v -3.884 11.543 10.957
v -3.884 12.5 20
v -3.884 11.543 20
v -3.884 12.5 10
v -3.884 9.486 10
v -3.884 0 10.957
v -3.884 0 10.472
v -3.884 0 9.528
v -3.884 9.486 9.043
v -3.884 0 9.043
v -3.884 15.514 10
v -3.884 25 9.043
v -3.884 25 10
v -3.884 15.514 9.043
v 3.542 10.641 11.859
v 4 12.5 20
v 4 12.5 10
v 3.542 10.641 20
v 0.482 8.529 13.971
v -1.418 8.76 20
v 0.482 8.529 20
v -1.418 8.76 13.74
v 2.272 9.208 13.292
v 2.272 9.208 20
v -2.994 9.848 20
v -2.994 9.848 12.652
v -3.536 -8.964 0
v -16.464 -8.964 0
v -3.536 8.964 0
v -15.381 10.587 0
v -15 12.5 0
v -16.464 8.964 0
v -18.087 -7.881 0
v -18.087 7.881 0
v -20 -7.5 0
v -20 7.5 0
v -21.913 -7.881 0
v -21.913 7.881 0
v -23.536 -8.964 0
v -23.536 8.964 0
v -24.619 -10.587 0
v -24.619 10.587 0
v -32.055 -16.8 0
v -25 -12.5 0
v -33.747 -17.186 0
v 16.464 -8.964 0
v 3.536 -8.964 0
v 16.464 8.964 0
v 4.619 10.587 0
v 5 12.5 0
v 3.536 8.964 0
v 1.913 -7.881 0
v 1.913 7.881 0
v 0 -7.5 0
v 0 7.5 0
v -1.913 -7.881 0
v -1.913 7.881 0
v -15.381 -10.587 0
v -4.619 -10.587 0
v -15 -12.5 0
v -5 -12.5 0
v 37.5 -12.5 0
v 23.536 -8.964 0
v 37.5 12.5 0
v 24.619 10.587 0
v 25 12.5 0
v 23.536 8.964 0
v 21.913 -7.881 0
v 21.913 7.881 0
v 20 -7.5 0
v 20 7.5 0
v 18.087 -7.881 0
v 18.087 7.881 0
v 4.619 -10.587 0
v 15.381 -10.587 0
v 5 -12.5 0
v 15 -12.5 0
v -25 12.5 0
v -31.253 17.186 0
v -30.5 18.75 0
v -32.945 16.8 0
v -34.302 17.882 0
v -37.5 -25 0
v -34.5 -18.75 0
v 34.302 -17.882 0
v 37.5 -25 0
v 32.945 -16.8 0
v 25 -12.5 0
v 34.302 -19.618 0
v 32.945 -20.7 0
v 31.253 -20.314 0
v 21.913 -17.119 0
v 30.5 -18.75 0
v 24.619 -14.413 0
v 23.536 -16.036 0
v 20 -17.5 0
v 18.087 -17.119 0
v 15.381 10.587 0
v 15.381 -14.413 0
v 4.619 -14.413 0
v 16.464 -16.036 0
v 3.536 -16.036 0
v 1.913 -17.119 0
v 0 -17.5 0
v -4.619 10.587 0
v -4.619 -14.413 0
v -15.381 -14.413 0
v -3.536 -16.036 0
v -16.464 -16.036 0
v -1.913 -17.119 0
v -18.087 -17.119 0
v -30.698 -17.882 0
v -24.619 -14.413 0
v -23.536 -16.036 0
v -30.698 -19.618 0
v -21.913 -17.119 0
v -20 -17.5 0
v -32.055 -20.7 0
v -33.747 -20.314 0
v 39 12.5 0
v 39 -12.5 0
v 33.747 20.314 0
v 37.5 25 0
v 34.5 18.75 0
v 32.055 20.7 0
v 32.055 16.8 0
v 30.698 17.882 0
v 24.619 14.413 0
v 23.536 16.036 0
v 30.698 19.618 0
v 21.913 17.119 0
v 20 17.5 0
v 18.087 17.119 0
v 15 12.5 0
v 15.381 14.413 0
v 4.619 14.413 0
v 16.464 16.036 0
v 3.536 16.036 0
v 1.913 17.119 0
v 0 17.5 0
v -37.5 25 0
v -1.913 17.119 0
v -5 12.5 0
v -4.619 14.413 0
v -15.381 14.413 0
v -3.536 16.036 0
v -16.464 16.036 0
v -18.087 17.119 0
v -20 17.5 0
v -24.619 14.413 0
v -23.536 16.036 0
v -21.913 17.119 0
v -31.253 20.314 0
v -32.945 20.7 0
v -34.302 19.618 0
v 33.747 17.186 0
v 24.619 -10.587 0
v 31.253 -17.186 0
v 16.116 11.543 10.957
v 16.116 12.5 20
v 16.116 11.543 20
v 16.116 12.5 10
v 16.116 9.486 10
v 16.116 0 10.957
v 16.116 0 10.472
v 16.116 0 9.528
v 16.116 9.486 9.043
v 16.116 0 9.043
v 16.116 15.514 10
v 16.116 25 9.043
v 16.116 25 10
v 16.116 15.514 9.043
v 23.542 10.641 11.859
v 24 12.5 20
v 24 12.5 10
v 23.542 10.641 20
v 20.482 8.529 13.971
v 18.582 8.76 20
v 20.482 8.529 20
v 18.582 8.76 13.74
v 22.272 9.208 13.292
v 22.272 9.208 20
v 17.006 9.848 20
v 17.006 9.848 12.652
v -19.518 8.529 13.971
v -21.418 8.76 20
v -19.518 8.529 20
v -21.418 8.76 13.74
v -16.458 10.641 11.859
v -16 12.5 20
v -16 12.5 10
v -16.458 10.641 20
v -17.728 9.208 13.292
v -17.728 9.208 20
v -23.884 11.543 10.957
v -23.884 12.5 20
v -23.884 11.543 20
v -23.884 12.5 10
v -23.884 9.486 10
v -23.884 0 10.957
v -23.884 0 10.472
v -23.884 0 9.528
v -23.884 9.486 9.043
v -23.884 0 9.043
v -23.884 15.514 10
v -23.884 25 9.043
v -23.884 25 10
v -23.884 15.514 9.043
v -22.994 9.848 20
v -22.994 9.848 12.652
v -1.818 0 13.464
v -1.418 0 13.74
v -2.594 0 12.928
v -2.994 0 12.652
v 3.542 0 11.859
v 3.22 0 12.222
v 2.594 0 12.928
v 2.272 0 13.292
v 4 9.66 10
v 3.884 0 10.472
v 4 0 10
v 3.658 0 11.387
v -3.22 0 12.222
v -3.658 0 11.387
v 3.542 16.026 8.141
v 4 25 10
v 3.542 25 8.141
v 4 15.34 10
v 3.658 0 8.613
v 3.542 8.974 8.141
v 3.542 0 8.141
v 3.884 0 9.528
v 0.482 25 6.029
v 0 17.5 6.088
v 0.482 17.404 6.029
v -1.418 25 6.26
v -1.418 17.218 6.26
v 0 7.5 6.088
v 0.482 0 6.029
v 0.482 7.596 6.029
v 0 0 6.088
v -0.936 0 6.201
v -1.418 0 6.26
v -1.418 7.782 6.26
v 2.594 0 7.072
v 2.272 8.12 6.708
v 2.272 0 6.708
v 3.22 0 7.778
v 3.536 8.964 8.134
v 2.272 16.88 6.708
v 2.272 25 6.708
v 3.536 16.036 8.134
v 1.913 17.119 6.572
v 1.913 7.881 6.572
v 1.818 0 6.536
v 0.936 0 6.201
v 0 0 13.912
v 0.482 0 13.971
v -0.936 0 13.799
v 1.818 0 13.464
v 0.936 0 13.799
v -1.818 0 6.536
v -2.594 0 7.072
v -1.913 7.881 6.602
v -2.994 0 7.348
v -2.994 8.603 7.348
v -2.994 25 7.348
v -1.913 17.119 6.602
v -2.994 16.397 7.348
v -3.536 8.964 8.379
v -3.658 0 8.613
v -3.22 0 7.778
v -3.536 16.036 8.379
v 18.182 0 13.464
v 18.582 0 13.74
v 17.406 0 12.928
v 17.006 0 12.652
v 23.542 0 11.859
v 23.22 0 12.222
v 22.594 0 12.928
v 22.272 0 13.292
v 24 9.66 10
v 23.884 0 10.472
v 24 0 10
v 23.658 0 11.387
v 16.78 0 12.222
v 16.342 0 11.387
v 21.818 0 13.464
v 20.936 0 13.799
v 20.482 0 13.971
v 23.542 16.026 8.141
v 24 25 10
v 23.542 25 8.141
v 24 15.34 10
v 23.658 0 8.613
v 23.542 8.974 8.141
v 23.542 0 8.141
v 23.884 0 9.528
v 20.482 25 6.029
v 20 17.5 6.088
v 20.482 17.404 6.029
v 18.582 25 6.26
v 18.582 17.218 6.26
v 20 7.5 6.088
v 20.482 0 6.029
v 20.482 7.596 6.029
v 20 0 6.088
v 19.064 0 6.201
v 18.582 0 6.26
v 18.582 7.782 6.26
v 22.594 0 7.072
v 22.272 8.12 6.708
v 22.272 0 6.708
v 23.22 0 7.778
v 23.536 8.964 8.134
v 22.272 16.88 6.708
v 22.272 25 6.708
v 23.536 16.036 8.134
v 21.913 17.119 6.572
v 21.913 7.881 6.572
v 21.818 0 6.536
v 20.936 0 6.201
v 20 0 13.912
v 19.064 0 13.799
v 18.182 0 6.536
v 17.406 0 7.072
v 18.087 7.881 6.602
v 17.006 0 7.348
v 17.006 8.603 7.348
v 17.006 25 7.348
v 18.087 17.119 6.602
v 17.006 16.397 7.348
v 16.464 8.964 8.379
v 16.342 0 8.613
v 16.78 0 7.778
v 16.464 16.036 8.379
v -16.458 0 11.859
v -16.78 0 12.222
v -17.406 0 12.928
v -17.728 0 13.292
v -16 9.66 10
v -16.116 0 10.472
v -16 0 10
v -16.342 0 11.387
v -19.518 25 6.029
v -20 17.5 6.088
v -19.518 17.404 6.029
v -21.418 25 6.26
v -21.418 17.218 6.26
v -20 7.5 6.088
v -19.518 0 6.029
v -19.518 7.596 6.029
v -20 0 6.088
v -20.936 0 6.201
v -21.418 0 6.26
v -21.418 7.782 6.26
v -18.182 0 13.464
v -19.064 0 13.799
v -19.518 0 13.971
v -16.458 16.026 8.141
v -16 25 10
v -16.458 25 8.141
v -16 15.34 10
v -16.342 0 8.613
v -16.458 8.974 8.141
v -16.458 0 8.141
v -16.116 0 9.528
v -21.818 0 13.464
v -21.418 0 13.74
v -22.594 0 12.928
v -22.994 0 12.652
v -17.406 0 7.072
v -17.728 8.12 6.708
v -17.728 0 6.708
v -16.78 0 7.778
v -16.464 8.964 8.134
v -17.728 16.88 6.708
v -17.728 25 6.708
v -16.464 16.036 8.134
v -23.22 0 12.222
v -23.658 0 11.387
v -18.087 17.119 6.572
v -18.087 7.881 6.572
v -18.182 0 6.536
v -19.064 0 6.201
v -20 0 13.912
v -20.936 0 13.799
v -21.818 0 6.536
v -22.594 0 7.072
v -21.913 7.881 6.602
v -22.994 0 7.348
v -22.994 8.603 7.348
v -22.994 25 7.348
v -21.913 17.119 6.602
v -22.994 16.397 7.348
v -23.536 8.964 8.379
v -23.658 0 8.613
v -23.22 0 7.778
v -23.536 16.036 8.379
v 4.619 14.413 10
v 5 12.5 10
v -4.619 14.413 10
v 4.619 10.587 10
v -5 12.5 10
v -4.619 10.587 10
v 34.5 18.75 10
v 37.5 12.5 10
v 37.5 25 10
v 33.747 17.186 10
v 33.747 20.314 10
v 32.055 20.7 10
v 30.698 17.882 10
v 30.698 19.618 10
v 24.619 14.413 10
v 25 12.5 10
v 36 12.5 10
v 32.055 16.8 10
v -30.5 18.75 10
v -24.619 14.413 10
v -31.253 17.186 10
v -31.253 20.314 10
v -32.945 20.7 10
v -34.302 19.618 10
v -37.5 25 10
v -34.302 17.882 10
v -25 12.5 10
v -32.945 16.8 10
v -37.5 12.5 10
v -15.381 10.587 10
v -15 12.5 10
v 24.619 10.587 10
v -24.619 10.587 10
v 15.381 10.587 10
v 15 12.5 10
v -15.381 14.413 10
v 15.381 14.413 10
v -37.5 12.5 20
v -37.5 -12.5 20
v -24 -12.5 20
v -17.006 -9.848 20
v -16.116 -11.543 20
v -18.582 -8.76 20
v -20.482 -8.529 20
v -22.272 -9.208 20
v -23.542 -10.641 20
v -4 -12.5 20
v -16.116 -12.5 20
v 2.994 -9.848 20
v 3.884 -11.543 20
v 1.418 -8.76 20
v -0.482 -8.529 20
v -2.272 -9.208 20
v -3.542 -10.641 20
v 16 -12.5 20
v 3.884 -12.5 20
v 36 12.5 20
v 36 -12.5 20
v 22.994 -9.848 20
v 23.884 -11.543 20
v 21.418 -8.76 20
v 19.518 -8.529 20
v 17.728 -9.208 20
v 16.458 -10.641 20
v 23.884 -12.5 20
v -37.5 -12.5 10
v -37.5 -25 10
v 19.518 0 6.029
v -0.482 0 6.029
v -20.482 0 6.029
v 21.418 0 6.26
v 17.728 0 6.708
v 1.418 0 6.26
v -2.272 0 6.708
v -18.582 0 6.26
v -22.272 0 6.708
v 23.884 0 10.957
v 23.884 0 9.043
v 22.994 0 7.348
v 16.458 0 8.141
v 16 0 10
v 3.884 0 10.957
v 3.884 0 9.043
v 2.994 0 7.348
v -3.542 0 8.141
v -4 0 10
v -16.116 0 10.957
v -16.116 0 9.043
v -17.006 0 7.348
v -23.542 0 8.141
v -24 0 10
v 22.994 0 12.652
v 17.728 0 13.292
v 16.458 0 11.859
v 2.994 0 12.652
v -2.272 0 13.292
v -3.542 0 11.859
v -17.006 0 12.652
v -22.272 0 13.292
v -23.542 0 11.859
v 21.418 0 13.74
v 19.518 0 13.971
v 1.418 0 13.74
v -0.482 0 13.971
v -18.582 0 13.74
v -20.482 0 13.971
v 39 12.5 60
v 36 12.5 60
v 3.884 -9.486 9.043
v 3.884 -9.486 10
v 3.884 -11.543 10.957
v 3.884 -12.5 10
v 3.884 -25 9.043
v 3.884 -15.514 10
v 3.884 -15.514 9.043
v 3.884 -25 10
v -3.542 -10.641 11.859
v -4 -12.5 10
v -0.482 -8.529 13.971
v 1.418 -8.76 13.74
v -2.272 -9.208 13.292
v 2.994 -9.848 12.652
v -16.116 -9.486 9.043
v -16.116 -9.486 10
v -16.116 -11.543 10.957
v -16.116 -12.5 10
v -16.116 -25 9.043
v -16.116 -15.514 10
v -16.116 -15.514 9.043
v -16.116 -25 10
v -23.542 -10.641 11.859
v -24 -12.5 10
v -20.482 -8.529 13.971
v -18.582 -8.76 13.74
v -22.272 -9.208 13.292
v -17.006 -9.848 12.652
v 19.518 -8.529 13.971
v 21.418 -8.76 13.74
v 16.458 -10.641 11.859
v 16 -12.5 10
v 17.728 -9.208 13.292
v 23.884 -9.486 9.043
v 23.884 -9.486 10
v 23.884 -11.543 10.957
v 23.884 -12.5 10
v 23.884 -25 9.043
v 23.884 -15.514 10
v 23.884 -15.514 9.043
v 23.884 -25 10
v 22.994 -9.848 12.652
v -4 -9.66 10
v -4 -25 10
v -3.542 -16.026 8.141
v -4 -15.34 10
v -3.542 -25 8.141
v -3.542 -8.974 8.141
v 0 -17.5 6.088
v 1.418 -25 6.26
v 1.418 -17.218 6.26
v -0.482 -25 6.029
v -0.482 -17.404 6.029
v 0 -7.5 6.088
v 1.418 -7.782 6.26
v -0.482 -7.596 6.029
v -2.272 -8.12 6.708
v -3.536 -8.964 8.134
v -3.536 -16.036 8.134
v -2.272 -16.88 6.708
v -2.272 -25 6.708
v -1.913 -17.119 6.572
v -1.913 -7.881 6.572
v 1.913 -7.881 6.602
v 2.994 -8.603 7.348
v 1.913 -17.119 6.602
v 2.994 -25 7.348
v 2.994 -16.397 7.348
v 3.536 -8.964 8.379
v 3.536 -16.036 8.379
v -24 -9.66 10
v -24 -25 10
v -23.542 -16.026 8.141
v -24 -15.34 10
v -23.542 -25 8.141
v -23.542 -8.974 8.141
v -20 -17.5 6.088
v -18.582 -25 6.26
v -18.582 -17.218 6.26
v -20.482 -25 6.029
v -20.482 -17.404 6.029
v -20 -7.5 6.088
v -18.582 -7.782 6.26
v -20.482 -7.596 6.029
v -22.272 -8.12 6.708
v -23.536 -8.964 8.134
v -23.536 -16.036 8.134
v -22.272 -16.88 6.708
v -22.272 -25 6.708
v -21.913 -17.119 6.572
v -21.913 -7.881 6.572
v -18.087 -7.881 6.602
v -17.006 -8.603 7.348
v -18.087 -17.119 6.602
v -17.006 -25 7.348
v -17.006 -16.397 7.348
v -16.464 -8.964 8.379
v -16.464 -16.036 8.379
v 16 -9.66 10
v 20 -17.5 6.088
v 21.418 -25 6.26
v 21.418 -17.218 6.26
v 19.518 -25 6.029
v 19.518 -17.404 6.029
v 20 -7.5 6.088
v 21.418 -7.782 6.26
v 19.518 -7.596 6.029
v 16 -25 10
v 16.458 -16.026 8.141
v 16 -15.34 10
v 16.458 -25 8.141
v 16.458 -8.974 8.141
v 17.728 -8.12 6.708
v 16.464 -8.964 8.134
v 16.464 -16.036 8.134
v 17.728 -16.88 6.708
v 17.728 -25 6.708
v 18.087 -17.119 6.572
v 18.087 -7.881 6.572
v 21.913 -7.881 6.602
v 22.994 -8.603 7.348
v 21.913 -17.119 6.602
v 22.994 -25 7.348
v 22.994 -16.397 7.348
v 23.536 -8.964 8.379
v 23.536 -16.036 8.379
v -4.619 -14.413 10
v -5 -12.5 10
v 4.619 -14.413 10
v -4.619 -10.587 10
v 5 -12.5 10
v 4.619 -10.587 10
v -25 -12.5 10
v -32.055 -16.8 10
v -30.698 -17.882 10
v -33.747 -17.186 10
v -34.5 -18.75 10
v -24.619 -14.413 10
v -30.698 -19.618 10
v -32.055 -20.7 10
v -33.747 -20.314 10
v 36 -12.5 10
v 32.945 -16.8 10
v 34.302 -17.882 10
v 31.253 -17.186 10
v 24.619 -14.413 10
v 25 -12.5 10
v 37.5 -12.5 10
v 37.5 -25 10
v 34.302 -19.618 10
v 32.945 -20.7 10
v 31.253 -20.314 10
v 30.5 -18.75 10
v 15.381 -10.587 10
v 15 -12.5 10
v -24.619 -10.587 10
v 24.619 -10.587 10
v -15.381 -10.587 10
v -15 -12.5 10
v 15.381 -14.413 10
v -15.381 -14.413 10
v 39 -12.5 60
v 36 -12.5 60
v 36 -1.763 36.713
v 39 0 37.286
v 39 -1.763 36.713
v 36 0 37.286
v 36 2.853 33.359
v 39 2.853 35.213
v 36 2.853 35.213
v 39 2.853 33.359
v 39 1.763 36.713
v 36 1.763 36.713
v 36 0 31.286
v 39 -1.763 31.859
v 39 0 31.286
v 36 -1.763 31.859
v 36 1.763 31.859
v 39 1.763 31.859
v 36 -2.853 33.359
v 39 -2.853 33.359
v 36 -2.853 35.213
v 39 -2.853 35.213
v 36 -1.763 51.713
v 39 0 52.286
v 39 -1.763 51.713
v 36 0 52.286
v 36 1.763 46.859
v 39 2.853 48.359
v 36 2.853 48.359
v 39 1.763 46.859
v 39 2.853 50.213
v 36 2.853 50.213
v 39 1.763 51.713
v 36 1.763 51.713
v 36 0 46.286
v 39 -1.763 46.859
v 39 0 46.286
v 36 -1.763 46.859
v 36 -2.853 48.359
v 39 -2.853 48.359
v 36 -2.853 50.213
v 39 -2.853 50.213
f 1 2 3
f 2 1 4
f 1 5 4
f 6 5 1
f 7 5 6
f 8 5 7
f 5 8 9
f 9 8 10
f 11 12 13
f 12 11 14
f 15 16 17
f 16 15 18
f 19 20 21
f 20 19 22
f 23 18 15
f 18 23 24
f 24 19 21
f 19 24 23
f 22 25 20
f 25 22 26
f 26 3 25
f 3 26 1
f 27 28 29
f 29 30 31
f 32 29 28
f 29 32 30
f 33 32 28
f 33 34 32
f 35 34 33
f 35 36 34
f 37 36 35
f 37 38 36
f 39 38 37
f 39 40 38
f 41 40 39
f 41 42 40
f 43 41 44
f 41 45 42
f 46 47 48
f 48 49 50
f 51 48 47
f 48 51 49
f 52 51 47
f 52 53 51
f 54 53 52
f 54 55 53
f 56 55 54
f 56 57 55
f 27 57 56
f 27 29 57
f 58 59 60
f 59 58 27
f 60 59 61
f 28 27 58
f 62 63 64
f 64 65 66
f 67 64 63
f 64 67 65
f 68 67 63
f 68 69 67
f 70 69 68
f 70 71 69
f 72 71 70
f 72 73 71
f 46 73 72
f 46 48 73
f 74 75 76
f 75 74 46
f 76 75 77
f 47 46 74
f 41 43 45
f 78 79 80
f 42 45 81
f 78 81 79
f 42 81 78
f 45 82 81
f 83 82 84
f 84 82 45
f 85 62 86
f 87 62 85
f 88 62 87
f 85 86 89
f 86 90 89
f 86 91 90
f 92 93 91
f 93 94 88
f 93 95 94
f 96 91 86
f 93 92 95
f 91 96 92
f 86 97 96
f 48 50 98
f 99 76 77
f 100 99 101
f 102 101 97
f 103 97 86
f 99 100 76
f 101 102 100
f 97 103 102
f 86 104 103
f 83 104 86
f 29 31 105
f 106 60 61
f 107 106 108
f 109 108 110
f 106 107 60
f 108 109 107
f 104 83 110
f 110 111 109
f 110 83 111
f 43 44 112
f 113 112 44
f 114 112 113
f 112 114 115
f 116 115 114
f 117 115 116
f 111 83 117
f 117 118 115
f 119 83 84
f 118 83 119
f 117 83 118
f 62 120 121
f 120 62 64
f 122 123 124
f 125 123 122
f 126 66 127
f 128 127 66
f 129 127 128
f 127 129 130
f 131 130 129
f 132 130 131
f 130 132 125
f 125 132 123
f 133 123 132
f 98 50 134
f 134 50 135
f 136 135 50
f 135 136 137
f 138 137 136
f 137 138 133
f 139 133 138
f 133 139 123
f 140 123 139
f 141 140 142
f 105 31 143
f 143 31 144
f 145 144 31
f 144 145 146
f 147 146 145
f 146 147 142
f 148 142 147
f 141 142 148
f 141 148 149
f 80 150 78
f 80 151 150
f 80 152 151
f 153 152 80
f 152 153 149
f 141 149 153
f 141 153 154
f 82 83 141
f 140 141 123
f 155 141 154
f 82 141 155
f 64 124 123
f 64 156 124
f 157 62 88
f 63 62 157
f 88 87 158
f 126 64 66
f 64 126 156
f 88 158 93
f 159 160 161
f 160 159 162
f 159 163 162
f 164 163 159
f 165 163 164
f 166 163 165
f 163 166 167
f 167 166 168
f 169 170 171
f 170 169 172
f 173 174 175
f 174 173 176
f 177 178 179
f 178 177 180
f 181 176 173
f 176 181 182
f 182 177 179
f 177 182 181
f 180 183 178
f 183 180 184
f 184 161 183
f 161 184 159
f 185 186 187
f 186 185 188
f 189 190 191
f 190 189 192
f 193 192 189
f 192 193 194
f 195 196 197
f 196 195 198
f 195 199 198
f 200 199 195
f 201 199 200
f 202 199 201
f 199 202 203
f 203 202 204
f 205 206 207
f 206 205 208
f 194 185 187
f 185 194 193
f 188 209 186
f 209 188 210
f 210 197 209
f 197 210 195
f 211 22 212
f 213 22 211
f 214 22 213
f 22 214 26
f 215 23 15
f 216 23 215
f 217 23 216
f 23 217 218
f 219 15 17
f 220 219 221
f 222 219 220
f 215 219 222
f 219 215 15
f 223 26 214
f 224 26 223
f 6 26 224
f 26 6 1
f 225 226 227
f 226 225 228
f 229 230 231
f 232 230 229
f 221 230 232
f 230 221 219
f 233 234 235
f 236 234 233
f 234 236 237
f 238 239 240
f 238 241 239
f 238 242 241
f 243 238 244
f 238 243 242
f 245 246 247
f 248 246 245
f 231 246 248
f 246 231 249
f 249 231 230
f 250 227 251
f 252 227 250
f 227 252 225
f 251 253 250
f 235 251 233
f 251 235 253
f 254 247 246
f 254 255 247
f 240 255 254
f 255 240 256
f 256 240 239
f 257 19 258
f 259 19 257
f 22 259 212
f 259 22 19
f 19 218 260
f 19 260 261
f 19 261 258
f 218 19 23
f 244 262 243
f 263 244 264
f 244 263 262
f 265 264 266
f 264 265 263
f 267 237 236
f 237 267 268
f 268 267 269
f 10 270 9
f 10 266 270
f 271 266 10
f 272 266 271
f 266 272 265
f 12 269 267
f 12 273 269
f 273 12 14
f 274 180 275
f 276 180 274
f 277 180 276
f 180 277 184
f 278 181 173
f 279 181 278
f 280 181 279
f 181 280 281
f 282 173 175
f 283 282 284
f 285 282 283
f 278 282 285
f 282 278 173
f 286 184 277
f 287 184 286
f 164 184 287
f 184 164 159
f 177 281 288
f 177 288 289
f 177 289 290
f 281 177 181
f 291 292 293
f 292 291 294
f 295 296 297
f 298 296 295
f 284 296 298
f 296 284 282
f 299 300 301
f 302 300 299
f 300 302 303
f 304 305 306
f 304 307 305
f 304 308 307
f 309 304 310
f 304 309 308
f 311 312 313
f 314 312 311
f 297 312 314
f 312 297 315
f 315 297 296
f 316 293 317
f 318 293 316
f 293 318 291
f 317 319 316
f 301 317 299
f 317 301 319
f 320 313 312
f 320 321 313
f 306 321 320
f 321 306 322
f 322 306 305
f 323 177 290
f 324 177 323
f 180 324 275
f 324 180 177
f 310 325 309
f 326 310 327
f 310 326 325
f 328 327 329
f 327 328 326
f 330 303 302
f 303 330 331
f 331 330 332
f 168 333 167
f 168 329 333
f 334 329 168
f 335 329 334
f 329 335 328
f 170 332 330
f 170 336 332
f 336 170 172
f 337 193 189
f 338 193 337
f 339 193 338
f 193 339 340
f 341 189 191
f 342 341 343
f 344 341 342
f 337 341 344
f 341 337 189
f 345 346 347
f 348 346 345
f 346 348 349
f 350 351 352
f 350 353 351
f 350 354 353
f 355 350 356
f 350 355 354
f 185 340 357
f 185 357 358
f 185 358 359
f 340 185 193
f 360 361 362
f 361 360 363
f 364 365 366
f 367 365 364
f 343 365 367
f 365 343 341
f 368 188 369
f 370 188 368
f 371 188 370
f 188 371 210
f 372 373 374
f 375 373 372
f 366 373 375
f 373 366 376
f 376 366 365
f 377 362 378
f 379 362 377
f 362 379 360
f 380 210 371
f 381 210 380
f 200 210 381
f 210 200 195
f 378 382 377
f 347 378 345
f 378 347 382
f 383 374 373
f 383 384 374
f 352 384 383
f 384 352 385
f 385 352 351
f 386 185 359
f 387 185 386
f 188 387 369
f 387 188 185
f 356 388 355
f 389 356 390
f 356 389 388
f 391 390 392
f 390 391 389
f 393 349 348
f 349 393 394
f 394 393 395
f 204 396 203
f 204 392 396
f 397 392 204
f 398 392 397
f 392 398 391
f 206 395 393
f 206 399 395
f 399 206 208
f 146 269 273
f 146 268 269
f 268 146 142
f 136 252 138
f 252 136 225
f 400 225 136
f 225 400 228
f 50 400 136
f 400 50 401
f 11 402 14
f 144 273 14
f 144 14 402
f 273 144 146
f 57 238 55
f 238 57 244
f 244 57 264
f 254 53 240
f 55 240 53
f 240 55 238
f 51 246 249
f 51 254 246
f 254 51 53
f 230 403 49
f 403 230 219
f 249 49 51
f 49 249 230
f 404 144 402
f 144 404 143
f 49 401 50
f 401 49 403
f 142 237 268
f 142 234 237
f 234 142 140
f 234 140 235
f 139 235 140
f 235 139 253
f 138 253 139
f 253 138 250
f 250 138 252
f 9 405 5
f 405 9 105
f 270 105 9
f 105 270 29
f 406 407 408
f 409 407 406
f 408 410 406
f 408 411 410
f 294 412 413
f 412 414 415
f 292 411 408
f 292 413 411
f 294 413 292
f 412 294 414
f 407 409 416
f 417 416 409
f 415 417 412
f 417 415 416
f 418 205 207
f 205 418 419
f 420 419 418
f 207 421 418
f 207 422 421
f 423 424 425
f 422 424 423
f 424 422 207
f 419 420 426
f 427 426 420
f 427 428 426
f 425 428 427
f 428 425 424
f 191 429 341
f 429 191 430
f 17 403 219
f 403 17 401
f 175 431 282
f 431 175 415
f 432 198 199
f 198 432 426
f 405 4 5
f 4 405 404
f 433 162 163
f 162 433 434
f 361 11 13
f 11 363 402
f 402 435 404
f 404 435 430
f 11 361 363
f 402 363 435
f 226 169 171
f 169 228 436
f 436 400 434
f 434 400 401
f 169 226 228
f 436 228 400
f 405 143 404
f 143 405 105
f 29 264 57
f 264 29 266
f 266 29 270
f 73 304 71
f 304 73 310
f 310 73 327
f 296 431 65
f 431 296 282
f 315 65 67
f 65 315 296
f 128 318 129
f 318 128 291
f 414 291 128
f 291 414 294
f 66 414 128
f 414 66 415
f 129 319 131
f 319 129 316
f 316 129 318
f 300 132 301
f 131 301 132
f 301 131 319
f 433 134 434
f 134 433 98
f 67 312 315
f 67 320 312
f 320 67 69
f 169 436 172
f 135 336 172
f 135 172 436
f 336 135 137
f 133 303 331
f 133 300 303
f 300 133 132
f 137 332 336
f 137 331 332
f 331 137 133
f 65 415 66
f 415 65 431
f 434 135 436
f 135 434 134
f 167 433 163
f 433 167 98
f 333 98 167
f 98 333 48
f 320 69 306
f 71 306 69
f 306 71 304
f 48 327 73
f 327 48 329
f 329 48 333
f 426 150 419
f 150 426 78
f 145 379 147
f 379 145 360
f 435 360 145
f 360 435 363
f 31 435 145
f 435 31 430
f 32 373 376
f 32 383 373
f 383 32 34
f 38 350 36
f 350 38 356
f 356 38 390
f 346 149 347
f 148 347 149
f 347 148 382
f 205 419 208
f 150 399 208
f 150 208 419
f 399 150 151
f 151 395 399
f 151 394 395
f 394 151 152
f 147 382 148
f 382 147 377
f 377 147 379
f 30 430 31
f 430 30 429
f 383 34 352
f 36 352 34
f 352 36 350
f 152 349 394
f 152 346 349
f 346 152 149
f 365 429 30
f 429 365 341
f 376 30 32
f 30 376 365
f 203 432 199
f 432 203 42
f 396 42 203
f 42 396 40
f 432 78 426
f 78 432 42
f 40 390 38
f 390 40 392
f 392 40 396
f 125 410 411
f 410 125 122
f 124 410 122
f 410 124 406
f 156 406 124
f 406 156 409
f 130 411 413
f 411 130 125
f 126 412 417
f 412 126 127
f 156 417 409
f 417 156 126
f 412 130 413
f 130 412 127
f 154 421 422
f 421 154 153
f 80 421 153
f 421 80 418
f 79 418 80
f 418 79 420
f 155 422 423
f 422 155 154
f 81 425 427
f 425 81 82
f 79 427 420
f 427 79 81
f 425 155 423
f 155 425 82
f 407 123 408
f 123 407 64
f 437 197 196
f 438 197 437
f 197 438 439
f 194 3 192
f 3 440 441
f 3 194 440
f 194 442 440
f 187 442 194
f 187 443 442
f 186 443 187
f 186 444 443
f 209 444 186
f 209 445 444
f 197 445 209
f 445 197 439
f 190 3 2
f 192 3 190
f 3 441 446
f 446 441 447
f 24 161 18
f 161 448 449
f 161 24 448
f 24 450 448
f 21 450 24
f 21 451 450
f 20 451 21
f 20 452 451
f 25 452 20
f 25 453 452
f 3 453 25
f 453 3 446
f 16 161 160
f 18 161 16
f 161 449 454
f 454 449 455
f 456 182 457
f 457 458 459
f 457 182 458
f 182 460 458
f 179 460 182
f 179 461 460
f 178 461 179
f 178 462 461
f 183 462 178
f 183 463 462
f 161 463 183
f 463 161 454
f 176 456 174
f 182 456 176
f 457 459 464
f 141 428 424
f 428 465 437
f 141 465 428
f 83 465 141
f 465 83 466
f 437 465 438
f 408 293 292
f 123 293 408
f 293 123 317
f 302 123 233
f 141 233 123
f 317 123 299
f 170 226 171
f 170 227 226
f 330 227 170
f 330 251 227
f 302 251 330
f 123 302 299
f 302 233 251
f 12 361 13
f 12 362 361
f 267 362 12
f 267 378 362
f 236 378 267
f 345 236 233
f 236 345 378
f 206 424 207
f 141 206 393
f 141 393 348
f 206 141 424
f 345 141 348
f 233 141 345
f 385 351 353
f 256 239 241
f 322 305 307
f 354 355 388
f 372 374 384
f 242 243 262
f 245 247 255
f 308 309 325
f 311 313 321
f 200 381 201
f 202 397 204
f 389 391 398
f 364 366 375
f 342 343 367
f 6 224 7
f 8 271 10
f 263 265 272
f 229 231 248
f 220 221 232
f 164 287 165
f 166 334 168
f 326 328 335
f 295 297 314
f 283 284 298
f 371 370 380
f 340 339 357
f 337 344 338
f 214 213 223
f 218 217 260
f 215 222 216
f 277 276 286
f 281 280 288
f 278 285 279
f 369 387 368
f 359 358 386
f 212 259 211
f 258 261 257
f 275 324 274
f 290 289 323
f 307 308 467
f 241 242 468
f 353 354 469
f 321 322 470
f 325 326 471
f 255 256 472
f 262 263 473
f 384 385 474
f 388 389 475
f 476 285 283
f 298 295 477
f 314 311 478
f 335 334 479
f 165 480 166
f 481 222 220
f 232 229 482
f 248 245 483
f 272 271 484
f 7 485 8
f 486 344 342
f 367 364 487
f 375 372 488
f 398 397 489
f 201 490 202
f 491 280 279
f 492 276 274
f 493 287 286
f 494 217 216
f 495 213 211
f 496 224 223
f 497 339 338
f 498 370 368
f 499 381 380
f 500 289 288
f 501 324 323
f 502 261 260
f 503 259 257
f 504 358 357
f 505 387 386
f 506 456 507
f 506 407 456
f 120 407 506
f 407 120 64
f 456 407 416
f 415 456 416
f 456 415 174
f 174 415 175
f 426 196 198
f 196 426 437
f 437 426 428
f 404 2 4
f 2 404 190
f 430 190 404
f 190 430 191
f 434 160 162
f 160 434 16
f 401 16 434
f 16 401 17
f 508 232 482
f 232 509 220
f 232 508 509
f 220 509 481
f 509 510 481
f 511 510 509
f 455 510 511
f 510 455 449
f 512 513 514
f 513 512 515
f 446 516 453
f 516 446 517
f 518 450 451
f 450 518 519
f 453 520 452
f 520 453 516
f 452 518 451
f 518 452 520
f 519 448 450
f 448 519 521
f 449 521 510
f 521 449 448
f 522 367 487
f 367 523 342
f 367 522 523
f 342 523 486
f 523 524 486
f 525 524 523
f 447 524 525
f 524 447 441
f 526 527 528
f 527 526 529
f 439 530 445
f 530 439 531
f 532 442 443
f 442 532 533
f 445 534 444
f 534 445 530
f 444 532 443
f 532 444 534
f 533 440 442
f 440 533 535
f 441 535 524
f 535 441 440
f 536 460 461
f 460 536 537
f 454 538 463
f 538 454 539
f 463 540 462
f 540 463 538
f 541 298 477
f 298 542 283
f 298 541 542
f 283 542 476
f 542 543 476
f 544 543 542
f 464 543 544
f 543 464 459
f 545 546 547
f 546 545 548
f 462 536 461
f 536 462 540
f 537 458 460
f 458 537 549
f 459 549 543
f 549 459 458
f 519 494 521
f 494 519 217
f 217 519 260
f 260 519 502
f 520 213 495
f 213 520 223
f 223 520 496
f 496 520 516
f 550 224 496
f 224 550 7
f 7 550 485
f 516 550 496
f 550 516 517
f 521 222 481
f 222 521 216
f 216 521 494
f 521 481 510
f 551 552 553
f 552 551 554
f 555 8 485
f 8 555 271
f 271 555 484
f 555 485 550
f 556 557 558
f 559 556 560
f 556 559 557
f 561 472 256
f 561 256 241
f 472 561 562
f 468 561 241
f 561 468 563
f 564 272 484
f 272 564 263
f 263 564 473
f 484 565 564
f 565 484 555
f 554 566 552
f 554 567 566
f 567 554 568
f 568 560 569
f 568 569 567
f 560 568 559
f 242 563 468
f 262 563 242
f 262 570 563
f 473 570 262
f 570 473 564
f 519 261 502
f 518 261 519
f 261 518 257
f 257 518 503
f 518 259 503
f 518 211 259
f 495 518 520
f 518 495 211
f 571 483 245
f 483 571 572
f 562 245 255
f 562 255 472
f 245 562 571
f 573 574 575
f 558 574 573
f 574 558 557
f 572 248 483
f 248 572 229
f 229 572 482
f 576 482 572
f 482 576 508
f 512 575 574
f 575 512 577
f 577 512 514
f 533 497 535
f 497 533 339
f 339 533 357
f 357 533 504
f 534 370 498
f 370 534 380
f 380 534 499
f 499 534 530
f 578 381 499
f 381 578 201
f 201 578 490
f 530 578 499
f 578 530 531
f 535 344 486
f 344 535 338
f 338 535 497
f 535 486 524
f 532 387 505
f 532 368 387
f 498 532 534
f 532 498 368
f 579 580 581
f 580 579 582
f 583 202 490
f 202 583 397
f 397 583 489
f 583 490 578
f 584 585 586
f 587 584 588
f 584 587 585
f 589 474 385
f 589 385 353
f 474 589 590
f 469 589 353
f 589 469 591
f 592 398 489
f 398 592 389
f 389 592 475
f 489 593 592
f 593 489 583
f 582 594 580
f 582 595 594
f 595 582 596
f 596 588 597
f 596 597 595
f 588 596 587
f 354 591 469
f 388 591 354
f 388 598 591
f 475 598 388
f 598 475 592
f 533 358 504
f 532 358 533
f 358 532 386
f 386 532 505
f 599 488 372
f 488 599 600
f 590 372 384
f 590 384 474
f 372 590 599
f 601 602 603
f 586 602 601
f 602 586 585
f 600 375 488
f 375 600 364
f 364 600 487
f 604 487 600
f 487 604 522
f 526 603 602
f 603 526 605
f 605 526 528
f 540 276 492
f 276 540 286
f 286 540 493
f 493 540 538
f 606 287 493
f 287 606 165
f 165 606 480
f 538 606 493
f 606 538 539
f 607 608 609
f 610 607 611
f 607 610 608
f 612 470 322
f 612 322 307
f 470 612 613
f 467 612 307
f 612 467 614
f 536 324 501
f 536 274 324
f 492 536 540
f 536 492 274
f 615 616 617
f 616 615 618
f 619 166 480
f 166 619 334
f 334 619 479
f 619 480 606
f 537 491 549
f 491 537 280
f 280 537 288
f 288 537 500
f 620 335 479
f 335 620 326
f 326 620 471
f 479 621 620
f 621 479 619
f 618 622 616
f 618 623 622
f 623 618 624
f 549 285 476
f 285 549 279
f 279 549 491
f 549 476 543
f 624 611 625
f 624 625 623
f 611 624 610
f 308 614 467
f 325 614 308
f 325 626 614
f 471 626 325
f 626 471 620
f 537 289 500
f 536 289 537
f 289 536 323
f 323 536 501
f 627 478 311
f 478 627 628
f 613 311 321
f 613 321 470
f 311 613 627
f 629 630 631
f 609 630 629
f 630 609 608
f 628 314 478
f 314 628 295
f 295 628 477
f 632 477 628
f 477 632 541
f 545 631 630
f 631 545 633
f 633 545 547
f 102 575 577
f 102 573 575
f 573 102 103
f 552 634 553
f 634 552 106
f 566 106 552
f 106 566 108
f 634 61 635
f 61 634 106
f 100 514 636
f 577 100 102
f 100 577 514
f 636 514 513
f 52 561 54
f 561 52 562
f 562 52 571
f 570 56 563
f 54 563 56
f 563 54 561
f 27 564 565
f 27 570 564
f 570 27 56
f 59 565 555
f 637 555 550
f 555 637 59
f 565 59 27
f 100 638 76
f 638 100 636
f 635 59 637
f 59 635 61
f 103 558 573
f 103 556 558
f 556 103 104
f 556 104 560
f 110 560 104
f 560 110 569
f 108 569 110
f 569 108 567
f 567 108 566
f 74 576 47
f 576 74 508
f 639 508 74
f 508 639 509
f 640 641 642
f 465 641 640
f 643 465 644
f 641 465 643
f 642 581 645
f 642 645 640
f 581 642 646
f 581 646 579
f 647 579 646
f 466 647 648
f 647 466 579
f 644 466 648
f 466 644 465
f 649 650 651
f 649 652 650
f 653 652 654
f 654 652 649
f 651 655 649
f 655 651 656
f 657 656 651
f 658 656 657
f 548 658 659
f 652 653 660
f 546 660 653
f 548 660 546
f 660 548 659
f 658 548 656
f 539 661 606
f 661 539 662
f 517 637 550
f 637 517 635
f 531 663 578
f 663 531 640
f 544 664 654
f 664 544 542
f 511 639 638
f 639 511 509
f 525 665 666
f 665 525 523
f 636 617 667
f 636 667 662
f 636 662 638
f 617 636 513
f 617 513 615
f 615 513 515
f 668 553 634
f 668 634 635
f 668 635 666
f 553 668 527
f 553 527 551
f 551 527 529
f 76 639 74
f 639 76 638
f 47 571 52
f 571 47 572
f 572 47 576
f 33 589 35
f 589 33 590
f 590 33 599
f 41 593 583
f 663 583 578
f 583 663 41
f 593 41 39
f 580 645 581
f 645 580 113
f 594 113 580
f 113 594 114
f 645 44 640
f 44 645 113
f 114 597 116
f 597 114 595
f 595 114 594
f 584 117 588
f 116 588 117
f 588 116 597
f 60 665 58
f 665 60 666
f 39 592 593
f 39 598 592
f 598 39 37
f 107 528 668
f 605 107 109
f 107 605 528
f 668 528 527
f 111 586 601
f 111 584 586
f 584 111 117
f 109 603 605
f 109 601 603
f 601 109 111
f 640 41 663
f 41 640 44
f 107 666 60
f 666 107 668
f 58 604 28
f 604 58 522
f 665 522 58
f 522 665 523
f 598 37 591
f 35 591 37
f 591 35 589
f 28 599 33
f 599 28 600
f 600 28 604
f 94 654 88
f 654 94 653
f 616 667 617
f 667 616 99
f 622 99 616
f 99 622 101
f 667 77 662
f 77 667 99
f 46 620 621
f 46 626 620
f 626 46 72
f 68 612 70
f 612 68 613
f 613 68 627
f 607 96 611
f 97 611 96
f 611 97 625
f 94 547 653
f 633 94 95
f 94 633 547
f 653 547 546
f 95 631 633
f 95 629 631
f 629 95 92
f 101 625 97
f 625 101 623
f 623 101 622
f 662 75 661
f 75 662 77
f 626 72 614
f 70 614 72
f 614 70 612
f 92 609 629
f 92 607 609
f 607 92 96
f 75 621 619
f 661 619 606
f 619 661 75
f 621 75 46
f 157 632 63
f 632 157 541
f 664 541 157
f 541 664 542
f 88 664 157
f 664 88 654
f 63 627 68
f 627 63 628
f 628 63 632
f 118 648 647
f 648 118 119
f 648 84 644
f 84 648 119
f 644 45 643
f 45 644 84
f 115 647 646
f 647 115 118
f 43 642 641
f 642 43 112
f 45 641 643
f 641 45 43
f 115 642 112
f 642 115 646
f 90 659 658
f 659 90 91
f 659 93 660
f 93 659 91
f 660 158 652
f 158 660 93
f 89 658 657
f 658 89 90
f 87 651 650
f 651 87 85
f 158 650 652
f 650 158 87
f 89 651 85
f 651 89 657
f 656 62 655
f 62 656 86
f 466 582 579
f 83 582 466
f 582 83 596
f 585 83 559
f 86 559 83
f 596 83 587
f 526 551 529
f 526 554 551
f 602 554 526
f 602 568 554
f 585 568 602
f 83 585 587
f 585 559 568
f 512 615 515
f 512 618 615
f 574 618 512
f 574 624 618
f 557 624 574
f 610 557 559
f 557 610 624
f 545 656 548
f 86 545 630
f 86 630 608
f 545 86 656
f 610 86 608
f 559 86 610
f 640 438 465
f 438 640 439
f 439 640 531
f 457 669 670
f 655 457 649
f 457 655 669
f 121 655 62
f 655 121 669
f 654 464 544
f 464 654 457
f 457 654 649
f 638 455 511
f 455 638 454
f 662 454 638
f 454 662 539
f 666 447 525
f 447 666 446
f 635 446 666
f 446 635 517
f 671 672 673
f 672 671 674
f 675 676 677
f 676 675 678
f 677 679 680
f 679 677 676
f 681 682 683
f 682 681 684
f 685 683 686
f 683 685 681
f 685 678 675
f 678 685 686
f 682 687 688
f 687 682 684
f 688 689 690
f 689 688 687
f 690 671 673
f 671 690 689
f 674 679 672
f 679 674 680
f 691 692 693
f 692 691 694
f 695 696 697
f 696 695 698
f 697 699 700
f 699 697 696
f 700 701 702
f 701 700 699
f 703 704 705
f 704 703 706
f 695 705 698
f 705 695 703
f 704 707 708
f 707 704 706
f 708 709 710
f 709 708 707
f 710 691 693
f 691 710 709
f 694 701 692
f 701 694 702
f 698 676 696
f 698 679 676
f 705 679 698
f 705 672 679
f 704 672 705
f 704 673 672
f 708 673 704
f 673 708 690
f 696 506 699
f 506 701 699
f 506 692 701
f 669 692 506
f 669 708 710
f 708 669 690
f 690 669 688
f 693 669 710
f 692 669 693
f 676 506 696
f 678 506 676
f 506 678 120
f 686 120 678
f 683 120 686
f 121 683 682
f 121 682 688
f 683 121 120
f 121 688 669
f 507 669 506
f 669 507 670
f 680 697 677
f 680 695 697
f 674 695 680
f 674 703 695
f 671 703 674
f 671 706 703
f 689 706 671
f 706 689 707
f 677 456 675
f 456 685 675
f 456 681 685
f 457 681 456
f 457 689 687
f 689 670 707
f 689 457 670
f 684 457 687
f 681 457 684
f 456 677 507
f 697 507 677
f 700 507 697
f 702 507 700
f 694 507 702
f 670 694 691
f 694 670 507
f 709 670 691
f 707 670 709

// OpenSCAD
union() {
	translate(v = [0, 12.5000000000, 0]) {
		difference() {
			translate(v = [0, 0, 10.0000000000]) {
				cube(center = true, size = [75, 25, 20]);
			}
			translate(v = [0, 12.5000000000, 0]) {
				translate(v = [0, 0, 10.0000000000]) {
					translate(v = [0, 0, 10.0000000000]) {
						cube(center = true, size = [75, 25, 20]);
					}
				}
			}
			union() {
				cylinder(d = 8, h = 30);
				translate(v = [20, 0, 0]) {
					cylinder(d = 8, h = 30);
				}
				translate(v = [-20, 0, 0]) {
					cylinder(d = 8, h = 30);
				}
			}
			translate(v = [0, 15.0000000000, 0]) {
				translate(v = [0, 0, 10.0000000000]) {
					rotate(a = [90, 0, 0]) {
						union() {
							cylinder(d = 8, h = 30);
							translate(v = [20, 0, 0]) {
								cylinder(d = 8, h = 30);
							}
							translate(v = [-20, 0, 0]) {
								cylinder(d = 8, h = 30);
							}
						}
					}
				}
			}
			union() {
				cylinder(d = 10, h = 10.0000000000);
				translate(v = [20, 0, 0]) {
					cylinder(d = 10, h = 10.0000000000);
				}
				translate(v = [-20, 0, 0]) {
					cylinder(d = 10, h = 10.0000000000);
				}
			}
			union() {
				translate(v = [32.5000000000, 0, 0]) {
					translate(v = [0, 6.2500000000, 0]) {
						cylinder(d = 4, h = 30);
					}
				}
				translate(v = [-32.5000000000, 0, 0]) {
					translate(v = [0, 6.2500000000, 0]) {
						cylinder(d = 4, h = 30);
					}
				}
			}
		}
	}
	rotate(a = [0, 0, 180]) {
		translate(v = [0, 12.5000000000, 0]) {
			difference() {
				translate(v = [0, 0, 10.0000000000]) {
					cube(center = true, size = [75, 25, 20]);
				}
				translate(v = [0, 12.5000000000, 0]) {
					translate(v = [0, 0, 10.0000000000]) {
						translate(v = [0, 0, 10.0000000000]) {
							cube(center = true, size = [75, 25, 20]);
						}
					}
				}
				union() {
					cylinder(d = 8, h = 30);
					translate(v = [20, 0, 0]) {
						cylinder(d = 8, h = 30);
					}
					translate(v = [-20, 0, 0]) {
						cylinder(d = 8, h = 30);
					}
				}
				translate(v = [0, 15.0000000000, 0]) {
					translate(v = [0, 0, 10.0000000000]) {
						rotate(a = [90, 0, 0]) {
							union() {
								cylinder(d = 8, h = 30);
								translate(v = [20, 0, 0]) {
									cylinder(d = 8, h = 30);
								}
								translate(v = [-20, 0, 0]) {
									cylinder(d = 8, h = 30);
								}
							}
						}
					}
				}
				union() {
					cylinder(d = 10, h = 10.0000000000);
					translate(v = [20, 0, 0]) {
						cylinder(d = 10, h = 10.0000000000);
					}
					translate(v = [-20, 0, 0]) {
						cylinder(d = 10, h = 10.0000000000);
					}
				}
				union() {
					translate(v = [32.5000000000, 0, 0]) {
						translate(v = [0, 6.2500000000, 0]) {
							cylinder(d = 4, h = 30);
						}
					}
					translate(v = [-32.5000000000, 0, 0]) {
						translate(v = [0, 6.2500000000, 0]) {
							cylinder(d = 4, h = 30);
						}
					}
				}
			}
		}
	}
	difference() {
		translate(v = [37.5000000000, 0, 0]) {
			translate(v = [0, 0, 30.0000000000]) {
				cube(center = true, size = [3, 25, 60]);
			}
		}
		union() {
			translate(v = [0, 0, 34.2857142857]) {
				translate(v = [25.0000000000, 0, 0]) {
					rotate(a = [0, 90, 0]) {
						cylinder(d = 6, h = 30);
					}
				}
			}
			translate(v = [0, 0, 15]) {
				translate(v = [0, 0, 34.2857142857]) {
					translate(v = [25.0000000000, 0, 0]) {
						rotate(a = [0, 90, 0]) {
							cylinder(d = 6, h = 30);
						}
					}
				}
			}
		}
	}
}
